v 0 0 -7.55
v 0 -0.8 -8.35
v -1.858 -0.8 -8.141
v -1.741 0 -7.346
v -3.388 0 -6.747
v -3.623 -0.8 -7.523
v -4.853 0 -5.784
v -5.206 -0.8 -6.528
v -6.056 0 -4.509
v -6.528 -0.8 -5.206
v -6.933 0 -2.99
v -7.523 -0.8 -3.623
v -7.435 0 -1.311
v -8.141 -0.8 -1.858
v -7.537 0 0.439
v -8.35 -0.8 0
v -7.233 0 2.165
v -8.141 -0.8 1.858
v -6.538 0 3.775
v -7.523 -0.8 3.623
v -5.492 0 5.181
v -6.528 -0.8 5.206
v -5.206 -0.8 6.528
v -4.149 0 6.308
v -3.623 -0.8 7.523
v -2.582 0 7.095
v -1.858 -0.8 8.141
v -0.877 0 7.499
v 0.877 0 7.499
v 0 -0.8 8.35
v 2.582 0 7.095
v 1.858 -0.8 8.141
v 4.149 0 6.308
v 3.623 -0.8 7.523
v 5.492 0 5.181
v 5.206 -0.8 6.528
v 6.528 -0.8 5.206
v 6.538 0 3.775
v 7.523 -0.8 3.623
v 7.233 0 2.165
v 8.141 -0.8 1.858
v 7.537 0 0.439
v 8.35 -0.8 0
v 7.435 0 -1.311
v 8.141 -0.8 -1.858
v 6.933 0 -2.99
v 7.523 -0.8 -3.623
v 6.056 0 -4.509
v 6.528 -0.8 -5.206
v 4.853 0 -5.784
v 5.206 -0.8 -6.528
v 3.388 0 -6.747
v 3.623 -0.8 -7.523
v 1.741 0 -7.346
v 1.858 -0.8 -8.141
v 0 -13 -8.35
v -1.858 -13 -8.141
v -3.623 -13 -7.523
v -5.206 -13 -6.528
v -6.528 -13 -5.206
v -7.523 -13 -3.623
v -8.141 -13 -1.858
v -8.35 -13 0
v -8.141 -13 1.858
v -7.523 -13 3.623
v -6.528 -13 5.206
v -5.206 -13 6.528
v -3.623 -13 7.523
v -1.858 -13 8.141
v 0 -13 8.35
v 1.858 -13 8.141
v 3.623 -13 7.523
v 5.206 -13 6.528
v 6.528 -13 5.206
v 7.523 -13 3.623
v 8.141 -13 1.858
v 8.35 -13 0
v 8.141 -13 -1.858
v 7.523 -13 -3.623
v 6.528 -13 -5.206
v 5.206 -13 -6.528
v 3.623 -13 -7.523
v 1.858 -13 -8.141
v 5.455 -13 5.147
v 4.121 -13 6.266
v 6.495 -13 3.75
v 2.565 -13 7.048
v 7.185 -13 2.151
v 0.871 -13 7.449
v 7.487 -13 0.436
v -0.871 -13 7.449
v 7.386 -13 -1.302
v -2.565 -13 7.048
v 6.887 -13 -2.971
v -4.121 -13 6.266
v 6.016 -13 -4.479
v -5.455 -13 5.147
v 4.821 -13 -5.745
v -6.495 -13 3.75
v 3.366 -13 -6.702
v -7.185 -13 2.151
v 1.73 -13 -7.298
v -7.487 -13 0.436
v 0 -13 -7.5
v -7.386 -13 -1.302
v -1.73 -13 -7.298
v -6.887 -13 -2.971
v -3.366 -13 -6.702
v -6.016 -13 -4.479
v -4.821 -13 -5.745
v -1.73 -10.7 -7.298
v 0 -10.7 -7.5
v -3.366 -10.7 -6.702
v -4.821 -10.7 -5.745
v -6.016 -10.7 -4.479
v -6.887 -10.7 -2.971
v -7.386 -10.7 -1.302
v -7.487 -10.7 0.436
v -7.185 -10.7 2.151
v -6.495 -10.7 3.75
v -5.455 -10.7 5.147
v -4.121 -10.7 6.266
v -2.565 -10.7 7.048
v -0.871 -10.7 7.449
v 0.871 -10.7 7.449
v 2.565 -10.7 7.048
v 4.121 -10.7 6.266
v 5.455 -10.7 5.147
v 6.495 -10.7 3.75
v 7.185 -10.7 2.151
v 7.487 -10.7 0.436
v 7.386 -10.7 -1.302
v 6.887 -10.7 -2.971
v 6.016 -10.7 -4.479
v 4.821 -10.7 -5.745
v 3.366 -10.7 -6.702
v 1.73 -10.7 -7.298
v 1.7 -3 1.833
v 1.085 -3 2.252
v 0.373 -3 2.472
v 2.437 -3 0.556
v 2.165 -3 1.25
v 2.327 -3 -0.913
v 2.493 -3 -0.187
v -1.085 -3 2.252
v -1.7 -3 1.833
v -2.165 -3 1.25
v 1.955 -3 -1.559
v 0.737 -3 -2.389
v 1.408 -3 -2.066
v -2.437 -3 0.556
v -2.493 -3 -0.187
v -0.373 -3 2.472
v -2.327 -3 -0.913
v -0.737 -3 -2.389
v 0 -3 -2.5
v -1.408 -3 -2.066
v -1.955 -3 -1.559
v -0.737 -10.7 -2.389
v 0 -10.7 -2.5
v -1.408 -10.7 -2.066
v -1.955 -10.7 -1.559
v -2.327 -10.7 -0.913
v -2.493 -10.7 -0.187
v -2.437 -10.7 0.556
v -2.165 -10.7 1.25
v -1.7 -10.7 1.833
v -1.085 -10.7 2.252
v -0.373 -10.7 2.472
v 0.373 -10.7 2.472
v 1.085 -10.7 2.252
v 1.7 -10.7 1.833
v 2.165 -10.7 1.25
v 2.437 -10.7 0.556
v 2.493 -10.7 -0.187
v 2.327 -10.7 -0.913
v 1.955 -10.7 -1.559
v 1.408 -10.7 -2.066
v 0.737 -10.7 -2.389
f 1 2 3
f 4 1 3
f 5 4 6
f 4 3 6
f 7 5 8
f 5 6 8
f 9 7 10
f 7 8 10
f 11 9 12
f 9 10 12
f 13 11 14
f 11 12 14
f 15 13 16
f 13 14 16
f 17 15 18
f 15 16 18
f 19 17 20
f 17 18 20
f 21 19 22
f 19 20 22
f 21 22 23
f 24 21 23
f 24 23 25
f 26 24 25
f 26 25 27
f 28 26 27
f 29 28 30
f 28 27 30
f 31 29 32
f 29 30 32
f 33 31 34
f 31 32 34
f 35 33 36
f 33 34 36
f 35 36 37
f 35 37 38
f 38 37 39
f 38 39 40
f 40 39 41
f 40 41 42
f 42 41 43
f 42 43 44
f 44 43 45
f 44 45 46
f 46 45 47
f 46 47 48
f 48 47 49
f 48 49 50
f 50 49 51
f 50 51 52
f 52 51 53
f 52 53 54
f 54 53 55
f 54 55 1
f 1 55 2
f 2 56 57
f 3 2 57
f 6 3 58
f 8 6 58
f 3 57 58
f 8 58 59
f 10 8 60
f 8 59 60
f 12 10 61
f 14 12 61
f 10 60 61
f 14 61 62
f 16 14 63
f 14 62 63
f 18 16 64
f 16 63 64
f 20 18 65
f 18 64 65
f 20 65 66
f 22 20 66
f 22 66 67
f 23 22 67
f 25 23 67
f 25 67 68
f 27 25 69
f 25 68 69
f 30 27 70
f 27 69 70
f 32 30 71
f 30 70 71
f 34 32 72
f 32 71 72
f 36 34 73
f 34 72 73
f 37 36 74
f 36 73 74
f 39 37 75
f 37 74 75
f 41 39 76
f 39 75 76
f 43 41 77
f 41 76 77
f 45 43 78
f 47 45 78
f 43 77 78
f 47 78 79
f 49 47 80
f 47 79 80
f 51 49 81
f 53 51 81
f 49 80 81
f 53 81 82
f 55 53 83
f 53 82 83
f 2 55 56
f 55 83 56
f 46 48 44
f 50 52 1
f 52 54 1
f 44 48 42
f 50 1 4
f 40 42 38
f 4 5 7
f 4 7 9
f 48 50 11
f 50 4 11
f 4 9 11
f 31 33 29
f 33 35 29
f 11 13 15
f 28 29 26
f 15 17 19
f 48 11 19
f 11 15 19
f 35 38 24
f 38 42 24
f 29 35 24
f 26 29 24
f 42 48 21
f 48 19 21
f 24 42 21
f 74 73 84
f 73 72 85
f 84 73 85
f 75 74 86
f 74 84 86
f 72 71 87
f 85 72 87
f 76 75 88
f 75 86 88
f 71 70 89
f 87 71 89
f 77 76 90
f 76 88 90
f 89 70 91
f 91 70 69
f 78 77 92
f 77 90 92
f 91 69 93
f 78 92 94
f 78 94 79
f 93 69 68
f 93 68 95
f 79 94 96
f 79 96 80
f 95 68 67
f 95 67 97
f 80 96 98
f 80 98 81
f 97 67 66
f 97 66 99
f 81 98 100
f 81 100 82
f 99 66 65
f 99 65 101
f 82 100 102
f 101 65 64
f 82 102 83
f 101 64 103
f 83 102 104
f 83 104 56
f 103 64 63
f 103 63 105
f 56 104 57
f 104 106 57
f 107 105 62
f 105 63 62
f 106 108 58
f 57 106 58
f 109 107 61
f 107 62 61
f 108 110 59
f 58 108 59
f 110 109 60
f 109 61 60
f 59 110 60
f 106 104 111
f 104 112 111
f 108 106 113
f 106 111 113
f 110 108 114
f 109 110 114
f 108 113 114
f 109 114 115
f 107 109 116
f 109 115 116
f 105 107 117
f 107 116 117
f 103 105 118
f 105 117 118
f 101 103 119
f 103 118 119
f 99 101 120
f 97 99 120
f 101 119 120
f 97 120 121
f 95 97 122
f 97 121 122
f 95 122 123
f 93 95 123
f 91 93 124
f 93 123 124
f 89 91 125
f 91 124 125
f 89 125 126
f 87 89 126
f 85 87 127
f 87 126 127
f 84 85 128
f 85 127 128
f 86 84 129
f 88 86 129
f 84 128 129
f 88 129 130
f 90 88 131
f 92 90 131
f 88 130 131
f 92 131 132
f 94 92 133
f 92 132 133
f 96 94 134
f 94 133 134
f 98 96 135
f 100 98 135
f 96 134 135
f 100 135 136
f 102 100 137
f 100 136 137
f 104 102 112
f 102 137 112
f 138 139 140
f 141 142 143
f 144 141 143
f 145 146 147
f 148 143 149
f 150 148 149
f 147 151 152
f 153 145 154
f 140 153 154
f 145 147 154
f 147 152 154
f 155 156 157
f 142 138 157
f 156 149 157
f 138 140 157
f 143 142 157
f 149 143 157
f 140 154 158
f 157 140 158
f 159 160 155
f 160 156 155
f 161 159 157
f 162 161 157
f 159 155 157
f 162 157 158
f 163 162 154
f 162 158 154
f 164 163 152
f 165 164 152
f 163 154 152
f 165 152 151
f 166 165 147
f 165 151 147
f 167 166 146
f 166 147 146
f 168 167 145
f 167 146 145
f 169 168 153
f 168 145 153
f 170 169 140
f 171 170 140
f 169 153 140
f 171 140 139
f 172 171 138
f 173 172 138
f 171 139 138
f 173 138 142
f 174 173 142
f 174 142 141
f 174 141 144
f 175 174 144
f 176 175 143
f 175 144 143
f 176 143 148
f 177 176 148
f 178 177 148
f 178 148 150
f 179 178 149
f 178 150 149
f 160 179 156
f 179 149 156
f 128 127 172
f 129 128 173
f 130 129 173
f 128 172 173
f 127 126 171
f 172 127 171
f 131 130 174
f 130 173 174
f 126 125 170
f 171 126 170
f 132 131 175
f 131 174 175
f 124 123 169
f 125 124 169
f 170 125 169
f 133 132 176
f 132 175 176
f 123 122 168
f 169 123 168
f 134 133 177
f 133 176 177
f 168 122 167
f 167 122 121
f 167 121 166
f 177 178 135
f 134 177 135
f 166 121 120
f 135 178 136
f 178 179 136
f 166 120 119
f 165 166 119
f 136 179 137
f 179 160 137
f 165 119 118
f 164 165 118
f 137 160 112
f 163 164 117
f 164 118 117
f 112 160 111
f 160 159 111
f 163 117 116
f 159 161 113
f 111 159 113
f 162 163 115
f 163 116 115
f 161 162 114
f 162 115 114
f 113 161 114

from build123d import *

# Parameters (mm, degrees)
CHAMFER_1_SIZE = 0.8


with BuildPart() as part:
    # Эскиз1 → Повернуть1 (revolve)
    with BuildSketch(Plane.XY, mode=Mode.PRIVATE) as revolve_1_sk:
        Polygon((0, 0), (-8.35, 0), (-8.35, -13), (-7.5, -13), (-7.5, -10.7), (-2.5, -10.7), (-2.5, -3), (0, -3), align=None)
    revolve(revolve_1_sk.sketch.rotate(Axis((0, -3, 0), (0, 1, 0)), 270), axis=Axis((0, -3, 0), (0, 1, 0)))

    # Фаска1
    chamfer_1_edges = [part.edges().sort_by_distance(p)[0] for p in [
        (0, 0, 8.35),
    ]]
    chamfer(chamfer_1_edges, length=CHAMFER_1_SIZE)


solid = part.part
